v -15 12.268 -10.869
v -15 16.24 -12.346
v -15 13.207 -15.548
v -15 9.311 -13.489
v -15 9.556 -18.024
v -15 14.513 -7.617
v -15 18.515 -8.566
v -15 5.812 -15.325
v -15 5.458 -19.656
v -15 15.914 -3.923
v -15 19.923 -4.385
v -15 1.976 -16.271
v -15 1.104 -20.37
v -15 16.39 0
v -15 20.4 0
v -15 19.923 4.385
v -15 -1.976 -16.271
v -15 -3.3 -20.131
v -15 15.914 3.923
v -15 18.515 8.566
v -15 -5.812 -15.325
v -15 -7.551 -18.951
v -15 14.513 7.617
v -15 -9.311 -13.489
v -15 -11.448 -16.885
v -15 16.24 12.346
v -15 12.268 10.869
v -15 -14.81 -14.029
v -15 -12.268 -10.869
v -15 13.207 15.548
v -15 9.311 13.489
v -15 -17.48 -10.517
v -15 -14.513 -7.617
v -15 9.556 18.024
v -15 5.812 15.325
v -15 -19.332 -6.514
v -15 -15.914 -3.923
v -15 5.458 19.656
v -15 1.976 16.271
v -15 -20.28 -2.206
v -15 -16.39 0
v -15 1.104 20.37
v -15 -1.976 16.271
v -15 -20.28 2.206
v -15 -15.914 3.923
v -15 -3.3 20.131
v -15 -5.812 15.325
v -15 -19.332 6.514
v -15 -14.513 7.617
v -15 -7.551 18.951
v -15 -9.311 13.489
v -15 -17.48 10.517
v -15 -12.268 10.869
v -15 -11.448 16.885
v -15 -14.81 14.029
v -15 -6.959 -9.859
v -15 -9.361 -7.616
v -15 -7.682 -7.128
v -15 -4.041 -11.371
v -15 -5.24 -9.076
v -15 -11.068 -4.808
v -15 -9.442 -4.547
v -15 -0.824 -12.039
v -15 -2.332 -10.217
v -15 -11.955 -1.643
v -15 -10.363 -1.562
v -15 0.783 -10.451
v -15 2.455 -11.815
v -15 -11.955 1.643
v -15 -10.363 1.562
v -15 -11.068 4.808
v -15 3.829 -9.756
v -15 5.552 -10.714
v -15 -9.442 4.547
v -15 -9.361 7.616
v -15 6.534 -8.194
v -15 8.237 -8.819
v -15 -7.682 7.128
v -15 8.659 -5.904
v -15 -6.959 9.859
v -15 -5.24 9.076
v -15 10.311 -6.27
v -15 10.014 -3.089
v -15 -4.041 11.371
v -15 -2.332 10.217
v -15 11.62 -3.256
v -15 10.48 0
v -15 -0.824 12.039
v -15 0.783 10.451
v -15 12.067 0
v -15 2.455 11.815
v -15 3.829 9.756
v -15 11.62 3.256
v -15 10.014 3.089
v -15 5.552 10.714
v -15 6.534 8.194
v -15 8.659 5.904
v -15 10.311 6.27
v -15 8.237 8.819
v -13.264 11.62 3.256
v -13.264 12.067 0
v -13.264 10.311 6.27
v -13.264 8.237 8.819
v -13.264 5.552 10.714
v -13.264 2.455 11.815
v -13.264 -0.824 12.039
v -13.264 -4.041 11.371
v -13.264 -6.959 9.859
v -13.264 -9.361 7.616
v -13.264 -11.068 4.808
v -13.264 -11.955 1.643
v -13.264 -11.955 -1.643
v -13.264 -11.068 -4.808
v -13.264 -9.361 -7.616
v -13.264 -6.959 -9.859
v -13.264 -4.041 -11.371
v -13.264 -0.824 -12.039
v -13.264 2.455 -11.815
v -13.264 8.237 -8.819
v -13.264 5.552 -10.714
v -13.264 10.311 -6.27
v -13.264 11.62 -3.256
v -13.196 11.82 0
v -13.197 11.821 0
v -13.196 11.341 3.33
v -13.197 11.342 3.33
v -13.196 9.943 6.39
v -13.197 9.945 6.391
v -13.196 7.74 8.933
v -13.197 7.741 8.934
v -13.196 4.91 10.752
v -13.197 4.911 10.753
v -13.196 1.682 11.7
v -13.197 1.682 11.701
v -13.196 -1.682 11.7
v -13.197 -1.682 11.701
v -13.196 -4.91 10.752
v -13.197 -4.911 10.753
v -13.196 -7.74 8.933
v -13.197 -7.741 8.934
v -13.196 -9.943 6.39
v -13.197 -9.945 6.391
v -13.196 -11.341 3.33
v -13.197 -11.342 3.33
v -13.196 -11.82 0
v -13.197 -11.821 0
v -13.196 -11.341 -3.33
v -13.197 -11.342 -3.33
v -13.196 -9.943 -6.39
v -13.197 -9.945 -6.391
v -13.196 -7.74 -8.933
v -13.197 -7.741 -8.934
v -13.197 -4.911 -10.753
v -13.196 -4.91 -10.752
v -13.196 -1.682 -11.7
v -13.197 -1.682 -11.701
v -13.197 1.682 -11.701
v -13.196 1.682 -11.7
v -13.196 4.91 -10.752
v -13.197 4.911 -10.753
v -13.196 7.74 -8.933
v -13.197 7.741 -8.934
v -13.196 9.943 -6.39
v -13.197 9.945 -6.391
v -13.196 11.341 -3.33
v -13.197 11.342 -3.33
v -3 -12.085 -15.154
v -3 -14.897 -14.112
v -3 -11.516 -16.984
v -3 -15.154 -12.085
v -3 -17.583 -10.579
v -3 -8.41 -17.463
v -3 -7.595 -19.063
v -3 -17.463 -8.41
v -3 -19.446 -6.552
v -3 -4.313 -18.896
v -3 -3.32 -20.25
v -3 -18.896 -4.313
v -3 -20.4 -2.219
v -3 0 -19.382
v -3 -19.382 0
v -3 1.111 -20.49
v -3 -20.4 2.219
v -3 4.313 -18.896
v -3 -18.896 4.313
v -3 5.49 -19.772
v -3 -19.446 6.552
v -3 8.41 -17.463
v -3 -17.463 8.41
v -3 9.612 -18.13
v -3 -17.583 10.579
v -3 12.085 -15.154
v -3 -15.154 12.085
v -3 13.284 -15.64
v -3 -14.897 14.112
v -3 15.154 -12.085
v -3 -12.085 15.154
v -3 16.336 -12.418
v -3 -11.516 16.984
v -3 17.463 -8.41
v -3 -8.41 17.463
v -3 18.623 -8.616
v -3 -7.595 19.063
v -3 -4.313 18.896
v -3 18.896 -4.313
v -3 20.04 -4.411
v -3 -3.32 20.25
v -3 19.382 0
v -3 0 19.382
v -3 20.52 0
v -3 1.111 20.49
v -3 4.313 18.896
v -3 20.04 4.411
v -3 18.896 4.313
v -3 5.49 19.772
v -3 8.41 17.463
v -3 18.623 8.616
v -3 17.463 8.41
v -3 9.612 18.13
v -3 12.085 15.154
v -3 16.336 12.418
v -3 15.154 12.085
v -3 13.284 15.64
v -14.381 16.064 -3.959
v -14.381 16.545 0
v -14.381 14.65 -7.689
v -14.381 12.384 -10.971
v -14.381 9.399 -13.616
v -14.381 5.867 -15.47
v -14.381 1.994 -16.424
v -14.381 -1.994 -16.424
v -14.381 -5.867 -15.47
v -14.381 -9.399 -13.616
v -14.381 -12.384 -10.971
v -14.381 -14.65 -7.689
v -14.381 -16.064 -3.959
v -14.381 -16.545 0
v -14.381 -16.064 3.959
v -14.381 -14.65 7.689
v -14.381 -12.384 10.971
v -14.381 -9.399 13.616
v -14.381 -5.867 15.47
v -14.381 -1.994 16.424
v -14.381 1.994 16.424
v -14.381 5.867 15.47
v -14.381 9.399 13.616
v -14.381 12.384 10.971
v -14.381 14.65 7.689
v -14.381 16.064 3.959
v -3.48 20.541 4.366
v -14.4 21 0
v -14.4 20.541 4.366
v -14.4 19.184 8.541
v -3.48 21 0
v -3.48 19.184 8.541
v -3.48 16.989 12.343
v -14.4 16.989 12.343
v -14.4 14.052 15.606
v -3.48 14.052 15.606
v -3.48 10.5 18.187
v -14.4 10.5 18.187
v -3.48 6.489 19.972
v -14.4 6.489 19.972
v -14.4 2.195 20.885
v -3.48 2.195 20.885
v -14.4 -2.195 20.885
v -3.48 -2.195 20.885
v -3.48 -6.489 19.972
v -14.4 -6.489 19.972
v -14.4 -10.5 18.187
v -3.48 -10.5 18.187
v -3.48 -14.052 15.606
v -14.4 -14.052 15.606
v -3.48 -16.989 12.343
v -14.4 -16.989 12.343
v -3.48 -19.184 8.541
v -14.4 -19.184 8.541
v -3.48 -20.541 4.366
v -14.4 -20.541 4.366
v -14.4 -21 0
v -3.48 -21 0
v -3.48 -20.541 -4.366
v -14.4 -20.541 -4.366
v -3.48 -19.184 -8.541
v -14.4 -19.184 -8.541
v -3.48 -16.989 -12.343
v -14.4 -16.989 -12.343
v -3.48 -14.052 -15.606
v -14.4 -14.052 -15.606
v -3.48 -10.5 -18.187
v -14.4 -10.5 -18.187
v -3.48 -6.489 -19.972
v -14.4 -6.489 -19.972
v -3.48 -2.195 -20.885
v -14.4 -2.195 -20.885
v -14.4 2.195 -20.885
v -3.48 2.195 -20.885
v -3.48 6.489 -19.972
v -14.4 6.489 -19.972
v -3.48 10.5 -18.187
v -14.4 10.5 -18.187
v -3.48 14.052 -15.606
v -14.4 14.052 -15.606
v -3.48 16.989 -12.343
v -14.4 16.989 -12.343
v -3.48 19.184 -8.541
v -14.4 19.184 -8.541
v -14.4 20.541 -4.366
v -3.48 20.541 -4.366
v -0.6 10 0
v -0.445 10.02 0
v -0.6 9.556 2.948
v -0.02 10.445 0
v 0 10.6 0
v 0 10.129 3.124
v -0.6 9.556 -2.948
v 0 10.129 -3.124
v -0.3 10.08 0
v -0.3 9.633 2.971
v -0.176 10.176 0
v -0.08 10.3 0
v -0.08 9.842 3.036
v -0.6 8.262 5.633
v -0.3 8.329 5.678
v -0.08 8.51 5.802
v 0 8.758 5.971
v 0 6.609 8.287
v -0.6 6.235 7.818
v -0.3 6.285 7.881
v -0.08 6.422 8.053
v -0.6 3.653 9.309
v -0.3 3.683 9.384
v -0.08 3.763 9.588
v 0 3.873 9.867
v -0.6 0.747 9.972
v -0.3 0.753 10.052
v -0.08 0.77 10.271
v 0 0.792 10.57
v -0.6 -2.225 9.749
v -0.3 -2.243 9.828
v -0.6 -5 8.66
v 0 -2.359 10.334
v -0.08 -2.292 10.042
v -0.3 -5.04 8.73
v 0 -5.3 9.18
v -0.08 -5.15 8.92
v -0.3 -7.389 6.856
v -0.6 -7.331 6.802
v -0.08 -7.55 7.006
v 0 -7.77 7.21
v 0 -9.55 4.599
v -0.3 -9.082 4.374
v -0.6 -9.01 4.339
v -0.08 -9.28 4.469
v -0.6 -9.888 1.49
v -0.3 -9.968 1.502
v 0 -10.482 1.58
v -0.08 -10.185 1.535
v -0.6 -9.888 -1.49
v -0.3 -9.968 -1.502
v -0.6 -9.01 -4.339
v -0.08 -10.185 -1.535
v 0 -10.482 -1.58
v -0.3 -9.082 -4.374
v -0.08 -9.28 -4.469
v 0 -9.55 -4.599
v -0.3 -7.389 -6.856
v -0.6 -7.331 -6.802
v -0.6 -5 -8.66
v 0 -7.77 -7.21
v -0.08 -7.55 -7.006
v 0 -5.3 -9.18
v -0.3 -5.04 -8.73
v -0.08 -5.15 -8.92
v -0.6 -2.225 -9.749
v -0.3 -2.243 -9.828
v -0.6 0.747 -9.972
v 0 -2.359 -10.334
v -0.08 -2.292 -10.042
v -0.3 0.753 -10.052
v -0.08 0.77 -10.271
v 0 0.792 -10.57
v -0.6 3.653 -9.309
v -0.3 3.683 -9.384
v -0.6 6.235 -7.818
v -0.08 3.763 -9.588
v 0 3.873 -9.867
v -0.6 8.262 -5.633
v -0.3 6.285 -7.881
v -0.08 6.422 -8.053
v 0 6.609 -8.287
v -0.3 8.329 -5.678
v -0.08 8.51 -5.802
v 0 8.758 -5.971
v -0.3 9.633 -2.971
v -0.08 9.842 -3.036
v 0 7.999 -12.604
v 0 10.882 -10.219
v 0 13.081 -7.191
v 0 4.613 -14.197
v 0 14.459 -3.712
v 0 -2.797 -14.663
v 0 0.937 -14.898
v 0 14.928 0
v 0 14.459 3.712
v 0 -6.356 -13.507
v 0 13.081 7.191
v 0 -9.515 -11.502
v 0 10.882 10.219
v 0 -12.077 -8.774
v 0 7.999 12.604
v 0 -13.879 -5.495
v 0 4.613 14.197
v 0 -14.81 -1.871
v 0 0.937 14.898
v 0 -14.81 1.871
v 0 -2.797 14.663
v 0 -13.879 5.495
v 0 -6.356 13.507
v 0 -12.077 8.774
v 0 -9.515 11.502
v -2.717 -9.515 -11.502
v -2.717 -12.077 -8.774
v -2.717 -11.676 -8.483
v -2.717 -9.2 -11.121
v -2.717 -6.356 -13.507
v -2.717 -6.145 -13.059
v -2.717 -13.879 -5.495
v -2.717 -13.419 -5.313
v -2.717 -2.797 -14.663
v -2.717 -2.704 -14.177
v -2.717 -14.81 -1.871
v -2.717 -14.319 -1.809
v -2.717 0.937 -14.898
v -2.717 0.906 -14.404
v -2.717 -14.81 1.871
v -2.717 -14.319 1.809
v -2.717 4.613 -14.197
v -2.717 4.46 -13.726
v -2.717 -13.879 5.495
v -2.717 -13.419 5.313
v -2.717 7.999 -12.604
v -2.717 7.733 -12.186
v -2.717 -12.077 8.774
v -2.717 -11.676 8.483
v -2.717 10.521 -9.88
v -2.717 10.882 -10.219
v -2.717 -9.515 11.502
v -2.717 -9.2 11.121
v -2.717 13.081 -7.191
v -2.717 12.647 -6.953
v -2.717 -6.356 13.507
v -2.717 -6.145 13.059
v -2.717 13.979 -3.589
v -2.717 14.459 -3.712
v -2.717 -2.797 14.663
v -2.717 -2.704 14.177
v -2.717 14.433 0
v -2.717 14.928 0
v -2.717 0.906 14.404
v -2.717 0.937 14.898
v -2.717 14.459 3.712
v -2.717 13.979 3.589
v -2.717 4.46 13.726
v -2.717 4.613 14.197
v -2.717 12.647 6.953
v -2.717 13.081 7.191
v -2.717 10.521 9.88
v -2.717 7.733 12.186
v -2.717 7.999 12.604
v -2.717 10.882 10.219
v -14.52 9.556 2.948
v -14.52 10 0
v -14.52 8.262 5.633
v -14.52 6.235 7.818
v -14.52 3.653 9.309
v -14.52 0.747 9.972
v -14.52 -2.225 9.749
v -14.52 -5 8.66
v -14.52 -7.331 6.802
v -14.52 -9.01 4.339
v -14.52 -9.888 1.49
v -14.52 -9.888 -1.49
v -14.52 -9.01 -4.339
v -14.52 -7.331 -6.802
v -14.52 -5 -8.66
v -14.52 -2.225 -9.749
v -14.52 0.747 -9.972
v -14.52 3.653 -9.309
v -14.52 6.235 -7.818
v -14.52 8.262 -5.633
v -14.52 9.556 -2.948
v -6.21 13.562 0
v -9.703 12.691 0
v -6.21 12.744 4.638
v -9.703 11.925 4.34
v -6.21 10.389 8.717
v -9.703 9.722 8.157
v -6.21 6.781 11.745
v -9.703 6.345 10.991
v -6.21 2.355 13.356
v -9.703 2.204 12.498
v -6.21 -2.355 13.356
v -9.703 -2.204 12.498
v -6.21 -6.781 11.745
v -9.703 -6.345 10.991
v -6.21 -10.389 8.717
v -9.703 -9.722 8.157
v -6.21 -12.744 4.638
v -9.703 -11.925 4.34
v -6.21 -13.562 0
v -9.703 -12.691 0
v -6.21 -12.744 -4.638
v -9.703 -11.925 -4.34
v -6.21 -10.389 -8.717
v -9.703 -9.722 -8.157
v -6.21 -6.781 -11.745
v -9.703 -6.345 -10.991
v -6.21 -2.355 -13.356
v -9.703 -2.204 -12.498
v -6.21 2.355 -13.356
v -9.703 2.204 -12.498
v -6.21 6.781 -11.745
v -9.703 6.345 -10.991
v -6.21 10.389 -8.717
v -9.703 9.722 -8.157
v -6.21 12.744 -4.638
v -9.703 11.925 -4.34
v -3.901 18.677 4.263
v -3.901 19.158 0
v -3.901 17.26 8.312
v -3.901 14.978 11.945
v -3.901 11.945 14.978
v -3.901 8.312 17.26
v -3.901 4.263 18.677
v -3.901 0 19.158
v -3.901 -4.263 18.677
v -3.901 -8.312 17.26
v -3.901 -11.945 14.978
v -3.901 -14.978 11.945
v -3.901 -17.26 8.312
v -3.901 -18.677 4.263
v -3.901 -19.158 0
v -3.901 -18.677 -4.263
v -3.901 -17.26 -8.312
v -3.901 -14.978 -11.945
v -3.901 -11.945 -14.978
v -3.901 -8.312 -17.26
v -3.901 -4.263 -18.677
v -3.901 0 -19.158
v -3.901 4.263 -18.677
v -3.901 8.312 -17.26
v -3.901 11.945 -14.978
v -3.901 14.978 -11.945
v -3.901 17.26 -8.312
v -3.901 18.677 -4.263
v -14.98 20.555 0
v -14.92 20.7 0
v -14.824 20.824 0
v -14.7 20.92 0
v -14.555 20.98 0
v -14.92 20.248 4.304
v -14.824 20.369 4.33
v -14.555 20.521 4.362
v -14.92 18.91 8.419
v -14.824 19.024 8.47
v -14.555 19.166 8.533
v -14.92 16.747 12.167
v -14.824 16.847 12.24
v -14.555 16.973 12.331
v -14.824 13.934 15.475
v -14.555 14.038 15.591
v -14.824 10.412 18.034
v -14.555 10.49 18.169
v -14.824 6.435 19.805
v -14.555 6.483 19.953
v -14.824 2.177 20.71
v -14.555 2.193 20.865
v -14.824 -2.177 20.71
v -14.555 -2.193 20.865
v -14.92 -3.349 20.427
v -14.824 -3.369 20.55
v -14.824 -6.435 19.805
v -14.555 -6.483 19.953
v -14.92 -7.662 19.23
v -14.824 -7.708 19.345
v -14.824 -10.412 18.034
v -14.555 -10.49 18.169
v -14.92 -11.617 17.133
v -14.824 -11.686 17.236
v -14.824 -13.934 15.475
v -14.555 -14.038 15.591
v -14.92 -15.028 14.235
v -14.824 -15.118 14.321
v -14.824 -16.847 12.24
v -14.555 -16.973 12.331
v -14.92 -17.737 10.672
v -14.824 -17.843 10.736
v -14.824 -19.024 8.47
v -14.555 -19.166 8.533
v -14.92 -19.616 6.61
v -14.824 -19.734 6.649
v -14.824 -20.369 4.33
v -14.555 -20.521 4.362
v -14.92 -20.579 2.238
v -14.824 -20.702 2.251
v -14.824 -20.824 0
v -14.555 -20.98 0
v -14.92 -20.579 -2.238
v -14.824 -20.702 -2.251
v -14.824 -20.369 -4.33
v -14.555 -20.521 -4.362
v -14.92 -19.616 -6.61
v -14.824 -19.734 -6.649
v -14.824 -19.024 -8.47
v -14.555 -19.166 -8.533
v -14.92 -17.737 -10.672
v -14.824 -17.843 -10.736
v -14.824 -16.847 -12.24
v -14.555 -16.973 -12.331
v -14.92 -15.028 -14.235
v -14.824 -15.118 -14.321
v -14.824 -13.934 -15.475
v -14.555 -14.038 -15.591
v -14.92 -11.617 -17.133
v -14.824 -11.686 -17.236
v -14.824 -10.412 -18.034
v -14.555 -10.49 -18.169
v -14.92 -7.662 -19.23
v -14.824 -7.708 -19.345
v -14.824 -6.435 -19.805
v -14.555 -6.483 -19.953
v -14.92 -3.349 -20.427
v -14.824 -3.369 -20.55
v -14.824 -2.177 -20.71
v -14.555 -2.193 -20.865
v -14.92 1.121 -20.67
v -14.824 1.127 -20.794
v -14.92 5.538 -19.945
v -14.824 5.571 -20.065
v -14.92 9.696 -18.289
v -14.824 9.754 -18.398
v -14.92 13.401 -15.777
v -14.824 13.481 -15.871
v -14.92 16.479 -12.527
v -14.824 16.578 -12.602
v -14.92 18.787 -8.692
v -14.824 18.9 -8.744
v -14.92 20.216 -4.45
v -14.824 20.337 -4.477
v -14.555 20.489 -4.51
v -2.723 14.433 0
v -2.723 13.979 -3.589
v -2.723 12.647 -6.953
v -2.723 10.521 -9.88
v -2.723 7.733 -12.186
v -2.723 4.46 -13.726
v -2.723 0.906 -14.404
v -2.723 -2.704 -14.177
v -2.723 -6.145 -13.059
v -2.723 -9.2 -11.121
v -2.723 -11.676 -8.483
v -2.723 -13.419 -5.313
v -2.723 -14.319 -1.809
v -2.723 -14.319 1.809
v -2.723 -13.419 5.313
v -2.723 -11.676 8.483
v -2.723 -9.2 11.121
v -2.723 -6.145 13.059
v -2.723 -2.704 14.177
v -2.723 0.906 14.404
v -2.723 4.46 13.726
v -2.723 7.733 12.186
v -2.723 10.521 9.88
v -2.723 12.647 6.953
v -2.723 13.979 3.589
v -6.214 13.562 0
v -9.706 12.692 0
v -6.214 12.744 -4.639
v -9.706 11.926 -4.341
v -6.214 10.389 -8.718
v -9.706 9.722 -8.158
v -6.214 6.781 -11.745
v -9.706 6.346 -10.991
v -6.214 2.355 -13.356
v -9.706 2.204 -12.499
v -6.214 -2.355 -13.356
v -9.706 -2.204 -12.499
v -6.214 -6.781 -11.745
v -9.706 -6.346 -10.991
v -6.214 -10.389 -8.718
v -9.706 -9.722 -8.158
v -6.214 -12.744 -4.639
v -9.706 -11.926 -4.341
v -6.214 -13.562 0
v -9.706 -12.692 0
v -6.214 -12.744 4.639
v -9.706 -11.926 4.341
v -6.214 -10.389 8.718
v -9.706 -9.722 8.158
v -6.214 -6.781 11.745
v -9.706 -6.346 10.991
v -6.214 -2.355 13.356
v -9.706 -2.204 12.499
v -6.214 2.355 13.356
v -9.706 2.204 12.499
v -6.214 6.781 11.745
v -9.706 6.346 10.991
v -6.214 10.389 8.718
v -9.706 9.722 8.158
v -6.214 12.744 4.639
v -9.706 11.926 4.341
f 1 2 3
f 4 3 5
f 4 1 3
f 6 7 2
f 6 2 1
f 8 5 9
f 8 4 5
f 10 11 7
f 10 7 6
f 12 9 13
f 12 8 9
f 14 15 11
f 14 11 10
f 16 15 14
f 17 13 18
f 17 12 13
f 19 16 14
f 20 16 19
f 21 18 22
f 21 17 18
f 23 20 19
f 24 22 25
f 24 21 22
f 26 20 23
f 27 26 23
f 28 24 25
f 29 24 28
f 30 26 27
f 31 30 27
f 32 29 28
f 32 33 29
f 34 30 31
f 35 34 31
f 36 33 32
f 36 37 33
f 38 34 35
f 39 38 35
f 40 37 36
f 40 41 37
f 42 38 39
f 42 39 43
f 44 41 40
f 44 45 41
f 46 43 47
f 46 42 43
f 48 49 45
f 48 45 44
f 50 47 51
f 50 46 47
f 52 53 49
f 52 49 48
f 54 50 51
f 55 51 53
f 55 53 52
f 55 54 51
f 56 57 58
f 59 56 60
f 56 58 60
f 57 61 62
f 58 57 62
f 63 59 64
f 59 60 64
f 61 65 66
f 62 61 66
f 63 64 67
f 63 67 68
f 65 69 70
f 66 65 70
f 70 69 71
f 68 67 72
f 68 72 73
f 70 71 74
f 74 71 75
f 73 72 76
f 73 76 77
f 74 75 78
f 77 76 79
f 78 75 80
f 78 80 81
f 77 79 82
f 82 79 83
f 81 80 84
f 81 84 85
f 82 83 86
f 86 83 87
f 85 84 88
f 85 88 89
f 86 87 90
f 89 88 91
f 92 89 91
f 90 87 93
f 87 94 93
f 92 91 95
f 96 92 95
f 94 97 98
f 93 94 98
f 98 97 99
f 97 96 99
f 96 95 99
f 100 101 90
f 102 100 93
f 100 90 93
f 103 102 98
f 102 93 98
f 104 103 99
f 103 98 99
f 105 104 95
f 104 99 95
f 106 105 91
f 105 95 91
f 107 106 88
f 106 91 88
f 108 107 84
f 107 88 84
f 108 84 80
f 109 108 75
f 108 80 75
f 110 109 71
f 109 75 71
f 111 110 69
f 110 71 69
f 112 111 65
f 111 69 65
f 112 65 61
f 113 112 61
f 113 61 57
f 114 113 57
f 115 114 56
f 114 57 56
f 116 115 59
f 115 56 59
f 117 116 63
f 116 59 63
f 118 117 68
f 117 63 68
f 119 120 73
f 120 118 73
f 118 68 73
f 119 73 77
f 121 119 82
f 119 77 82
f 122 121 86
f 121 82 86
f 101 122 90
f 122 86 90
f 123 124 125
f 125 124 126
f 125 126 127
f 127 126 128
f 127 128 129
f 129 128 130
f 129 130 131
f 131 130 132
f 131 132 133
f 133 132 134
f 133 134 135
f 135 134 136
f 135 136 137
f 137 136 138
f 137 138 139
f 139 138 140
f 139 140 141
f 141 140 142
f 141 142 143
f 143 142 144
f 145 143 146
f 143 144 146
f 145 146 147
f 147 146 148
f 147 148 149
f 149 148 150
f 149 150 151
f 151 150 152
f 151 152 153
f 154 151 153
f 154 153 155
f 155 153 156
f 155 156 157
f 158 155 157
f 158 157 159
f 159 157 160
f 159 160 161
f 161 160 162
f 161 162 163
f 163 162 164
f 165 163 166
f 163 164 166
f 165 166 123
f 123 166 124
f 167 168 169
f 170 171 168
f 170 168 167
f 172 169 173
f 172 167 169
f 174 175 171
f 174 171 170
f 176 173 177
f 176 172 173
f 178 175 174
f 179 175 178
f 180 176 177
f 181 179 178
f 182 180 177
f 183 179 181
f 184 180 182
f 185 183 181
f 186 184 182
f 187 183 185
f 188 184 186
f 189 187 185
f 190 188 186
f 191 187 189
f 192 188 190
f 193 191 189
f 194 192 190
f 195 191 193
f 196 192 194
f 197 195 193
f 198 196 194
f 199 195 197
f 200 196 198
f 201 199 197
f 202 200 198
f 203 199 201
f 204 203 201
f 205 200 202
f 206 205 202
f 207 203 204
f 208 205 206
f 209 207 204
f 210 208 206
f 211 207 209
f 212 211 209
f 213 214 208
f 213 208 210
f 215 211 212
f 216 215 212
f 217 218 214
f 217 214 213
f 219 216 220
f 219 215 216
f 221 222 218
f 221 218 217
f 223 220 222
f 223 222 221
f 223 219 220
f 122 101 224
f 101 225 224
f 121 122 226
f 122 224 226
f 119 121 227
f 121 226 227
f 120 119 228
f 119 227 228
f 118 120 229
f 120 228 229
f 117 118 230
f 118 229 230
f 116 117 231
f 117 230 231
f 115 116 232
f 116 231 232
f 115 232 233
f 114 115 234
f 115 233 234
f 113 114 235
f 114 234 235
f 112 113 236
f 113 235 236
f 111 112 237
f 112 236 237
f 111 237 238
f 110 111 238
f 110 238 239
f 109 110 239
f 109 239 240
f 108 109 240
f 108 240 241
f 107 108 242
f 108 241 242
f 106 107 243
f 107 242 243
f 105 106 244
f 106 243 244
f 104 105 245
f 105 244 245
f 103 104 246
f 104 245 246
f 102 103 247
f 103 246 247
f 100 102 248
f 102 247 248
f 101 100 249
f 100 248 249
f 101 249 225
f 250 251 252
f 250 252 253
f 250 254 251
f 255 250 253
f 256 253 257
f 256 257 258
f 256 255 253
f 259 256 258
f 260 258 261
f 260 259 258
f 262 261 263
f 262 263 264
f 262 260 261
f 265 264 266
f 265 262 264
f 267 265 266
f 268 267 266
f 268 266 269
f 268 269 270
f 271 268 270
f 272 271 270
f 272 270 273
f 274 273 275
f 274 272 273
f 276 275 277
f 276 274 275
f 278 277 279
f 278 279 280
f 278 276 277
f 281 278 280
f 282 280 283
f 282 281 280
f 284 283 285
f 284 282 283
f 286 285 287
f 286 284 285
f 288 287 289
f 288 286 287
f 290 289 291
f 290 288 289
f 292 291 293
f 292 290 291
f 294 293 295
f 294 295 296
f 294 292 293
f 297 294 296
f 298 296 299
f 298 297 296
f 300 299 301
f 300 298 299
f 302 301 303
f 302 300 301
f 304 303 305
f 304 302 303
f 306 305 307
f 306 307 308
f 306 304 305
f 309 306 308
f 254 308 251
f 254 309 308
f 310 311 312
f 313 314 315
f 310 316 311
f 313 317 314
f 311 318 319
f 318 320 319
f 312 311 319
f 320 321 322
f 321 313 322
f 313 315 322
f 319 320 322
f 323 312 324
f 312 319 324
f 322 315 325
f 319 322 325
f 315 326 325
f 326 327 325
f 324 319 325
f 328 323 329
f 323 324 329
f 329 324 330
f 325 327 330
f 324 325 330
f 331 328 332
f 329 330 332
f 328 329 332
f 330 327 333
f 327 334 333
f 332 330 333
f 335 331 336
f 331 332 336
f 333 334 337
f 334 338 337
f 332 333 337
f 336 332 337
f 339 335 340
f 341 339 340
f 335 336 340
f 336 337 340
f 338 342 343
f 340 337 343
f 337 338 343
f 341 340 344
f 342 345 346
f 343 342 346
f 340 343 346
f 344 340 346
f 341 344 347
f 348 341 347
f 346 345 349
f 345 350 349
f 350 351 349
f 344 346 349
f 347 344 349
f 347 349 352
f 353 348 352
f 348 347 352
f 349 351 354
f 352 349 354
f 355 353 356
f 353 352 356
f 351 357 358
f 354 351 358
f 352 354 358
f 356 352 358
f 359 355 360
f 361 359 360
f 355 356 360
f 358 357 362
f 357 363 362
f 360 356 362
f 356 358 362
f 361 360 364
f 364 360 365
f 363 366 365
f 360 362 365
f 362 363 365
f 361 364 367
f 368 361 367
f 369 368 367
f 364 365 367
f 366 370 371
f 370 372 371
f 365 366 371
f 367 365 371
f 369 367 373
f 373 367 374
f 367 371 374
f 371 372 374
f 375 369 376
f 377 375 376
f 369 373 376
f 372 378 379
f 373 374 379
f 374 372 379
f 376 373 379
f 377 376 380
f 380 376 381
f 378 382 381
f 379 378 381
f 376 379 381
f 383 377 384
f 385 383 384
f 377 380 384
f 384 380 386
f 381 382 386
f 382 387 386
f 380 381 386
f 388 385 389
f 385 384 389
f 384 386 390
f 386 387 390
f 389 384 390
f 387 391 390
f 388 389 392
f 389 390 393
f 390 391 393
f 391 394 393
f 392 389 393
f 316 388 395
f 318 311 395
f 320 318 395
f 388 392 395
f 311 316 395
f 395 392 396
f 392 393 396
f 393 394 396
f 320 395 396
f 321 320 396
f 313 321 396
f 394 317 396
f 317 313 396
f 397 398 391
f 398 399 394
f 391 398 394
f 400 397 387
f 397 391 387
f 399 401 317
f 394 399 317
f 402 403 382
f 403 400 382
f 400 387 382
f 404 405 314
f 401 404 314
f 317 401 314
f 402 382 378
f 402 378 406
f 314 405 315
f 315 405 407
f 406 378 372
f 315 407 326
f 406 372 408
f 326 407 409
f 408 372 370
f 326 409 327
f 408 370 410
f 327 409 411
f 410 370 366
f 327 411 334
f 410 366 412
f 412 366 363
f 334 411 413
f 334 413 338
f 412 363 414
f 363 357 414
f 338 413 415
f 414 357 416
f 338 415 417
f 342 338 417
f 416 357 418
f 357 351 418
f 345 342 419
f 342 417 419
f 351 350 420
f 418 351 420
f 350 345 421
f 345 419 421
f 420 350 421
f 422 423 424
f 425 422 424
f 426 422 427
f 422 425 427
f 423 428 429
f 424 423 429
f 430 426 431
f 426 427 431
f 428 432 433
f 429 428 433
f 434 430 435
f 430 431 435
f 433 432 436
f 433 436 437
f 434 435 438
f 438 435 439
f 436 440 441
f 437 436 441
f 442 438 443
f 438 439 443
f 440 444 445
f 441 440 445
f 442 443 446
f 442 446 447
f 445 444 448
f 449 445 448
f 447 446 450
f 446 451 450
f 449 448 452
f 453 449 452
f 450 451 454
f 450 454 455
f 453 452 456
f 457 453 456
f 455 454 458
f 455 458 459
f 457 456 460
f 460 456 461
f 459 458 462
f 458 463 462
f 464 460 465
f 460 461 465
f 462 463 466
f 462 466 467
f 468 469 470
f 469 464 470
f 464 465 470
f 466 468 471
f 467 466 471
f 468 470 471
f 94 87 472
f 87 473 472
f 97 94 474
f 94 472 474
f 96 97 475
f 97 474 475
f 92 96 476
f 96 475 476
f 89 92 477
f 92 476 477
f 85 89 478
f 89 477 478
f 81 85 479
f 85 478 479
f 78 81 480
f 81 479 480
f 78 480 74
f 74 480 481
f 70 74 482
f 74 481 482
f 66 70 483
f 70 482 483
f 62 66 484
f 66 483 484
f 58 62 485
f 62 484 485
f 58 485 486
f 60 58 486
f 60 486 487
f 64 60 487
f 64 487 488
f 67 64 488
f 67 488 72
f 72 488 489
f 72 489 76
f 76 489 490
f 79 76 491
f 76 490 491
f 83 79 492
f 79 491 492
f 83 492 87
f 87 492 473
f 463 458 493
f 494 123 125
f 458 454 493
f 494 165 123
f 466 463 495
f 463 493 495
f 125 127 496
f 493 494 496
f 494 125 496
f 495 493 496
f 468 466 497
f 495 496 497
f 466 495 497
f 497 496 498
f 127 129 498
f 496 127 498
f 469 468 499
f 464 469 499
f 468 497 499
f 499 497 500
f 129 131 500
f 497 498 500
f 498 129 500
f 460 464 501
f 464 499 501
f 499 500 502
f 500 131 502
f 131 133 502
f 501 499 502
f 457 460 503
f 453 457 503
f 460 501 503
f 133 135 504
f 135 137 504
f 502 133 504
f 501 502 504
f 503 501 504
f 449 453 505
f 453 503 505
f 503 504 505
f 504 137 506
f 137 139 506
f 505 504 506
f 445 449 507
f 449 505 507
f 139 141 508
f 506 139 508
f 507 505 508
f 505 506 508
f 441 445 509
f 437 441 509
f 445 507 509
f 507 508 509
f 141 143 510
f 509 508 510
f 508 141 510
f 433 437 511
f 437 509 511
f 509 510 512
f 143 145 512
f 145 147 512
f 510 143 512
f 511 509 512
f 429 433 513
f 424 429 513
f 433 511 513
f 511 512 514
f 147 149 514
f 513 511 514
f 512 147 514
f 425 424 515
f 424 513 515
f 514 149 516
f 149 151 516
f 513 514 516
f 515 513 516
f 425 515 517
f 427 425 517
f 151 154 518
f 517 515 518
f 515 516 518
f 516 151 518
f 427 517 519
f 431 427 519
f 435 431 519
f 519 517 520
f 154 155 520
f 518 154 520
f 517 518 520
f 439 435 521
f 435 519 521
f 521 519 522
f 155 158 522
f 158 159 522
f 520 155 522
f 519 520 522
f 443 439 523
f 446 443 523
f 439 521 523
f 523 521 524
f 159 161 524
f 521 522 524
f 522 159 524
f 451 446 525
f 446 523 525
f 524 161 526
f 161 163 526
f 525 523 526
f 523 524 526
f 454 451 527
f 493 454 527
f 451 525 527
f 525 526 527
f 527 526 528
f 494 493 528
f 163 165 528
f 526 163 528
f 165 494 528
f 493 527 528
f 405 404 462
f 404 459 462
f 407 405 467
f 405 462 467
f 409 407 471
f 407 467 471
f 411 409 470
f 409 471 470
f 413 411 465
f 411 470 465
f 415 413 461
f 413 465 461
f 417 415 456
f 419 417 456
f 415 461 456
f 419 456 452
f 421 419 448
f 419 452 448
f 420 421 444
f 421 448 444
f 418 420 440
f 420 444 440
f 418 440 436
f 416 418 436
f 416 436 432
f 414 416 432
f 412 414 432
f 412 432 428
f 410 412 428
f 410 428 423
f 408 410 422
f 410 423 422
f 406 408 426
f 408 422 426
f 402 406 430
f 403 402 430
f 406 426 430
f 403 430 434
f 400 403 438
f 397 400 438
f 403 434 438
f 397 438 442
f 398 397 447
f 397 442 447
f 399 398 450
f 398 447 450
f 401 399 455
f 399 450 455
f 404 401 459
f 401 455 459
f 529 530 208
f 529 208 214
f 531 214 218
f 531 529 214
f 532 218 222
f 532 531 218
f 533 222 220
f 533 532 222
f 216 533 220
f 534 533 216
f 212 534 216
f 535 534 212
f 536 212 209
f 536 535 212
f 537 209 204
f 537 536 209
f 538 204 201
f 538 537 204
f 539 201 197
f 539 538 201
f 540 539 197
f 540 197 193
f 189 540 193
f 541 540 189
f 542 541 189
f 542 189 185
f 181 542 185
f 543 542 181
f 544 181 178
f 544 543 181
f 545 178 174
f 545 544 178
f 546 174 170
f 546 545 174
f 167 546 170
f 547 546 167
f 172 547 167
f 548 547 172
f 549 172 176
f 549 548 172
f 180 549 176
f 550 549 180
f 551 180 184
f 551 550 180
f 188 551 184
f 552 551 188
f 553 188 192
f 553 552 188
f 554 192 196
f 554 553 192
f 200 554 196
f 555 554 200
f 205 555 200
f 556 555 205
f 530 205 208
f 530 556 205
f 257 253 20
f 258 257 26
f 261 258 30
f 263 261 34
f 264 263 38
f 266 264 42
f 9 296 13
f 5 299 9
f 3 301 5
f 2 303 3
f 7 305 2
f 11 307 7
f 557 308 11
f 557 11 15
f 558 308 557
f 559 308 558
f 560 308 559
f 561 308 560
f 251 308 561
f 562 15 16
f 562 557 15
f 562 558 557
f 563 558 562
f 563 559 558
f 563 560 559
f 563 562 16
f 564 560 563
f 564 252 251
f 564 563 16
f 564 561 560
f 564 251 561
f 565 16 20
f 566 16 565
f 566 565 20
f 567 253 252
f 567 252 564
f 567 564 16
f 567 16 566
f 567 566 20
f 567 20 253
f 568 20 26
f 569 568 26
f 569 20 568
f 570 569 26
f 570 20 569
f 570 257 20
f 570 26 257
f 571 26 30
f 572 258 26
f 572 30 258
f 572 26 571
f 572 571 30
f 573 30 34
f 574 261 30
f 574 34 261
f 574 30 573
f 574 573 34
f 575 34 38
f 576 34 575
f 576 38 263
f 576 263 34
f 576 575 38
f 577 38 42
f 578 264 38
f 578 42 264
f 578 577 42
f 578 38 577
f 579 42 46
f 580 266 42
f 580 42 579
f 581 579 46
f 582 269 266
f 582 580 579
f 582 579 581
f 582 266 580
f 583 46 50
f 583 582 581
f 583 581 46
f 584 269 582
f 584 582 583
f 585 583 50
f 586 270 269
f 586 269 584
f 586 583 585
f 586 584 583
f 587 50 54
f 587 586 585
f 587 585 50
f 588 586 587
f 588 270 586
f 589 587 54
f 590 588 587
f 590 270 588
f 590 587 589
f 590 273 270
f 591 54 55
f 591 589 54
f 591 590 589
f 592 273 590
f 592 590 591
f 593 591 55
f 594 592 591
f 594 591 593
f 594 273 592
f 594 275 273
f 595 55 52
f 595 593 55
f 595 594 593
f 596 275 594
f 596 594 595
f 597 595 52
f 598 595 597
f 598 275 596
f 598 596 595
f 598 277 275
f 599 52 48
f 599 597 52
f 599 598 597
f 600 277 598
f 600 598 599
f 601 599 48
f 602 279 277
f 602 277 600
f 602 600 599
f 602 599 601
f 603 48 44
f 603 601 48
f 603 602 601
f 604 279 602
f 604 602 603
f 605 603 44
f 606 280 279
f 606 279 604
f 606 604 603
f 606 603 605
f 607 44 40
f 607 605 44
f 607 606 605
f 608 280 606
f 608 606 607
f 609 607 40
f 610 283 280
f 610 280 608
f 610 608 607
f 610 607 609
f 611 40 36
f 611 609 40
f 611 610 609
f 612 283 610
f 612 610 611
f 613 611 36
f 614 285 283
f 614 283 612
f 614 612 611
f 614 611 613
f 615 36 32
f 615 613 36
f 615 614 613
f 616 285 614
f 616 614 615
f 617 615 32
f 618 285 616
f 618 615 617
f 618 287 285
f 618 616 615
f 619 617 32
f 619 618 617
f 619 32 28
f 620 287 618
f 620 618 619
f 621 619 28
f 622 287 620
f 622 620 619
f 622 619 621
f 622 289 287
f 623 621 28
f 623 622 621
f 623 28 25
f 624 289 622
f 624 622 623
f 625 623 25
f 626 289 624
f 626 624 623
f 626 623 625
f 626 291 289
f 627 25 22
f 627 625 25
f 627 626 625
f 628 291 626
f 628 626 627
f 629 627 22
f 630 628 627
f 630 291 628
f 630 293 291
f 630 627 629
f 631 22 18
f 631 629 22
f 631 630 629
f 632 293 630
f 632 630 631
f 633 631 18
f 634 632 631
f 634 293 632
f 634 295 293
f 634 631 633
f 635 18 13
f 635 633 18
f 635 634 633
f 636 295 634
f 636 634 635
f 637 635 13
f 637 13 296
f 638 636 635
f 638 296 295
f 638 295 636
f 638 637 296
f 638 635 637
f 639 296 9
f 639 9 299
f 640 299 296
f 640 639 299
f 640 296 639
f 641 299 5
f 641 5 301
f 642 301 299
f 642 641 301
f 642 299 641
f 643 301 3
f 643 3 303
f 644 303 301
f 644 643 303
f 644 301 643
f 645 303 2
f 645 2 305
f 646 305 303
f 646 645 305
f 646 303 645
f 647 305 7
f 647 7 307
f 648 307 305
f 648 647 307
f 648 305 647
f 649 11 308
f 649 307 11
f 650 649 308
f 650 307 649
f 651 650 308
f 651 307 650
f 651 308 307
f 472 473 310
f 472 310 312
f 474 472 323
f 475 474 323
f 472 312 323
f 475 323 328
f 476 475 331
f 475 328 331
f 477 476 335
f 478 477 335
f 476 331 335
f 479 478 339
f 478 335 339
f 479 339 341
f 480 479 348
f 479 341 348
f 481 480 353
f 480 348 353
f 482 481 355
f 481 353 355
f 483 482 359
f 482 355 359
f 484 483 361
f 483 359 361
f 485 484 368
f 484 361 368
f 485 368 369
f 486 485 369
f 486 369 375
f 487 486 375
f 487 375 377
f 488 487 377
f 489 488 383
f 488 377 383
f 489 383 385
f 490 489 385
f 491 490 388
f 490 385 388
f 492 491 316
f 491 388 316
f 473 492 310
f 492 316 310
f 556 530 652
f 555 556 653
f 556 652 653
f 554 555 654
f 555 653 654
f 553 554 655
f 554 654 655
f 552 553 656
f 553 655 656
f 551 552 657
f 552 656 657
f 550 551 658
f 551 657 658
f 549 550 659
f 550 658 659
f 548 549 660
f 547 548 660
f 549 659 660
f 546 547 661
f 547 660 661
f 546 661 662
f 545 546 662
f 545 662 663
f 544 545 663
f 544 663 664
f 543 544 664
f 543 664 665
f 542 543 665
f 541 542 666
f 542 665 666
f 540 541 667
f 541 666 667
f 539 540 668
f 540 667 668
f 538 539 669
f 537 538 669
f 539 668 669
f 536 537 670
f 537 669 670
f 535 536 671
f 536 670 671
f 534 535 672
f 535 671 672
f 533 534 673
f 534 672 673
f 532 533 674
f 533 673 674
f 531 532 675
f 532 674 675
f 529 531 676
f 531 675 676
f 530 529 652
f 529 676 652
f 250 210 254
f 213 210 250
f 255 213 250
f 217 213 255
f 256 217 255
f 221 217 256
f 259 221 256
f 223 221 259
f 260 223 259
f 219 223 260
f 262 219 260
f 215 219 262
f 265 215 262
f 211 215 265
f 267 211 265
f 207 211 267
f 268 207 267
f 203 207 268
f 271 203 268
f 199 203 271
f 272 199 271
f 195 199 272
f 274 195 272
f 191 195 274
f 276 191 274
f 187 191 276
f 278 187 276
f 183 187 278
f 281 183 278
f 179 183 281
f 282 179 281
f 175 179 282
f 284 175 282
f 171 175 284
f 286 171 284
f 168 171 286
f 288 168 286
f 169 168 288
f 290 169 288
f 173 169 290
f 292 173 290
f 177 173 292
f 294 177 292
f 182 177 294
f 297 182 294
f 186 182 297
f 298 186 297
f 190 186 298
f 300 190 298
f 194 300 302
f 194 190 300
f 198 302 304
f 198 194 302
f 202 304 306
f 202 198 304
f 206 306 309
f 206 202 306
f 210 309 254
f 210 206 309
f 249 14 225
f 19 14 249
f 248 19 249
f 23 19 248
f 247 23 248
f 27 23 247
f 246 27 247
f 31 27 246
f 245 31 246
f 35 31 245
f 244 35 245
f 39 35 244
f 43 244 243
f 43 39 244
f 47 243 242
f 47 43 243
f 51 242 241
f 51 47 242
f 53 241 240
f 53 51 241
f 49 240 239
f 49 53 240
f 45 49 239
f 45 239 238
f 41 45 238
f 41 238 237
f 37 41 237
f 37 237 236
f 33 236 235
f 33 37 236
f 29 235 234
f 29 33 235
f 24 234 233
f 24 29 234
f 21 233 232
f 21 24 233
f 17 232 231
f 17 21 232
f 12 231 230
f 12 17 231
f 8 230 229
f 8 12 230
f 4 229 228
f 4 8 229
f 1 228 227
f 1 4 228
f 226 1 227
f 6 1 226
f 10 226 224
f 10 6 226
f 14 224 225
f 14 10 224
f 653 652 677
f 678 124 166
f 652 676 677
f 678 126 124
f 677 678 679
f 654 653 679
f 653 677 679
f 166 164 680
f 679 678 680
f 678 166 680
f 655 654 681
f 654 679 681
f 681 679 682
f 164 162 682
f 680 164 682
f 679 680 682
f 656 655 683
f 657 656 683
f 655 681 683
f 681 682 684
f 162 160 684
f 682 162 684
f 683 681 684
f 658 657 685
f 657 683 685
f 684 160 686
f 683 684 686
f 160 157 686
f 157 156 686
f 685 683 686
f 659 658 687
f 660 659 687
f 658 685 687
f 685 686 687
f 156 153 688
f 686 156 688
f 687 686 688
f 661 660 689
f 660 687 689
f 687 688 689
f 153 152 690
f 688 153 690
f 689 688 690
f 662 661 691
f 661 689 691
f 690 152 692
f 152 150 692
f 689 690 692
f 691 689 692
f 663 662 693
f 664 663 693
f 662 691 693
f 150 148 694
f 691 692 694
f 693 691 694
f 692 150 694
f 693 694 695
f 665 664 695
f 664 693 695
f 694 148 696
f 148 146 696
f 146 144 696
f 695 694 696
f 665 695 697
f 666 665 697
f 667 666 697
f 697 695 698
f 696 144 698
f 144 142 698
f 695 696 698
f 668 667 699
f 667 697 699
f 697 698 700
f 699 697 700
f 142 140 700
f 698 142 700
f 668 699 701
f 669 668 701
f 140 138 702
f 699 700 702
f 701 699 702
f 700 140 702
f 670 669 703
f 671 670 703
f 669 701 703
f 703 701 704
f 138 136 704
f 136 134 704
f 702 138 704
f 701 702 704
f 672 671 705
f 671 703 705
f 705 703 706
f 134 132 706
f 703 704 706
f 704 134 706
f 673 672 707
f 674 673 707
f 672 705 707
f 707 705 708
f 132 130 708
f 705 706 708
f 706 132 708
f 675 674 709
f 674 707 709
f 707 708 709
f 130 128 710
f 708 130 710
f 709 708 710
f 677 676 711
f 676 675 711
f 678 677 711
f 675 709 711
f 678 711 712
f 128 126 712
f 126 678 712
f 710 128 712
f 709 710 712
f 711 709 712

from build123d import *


with BuildPart() as part:
    # OutRacSke → OuterRace (revolve)
    with BuildSketch(Plane.XY):
        with BuildLine():
            Line((-3, 19.382436034), (-15, 16.3905))
            Line((-15, 16.3905), (-15, 20.4))
            ThreePointArc((-15, 20.4), (-14.824264069, 20.824264069), (-14.4, 21))
            Line((-14.4, 21), (-3.48, 21))
            Line((-3.48, 21), (-3, 20.52))
            Line((-3, 20.52), (-3, 19.382436034))
        make_face()
    revolve(axis=Axis((-42.5, 0, 0), (1, 0, 0)))

    # RolSimSke → RollersSimplified (revolve)
    with BuildSketch(Plane.XY):
        Polygon((-14.4, 16.622797286), (-3.920806156, 19.235553758), (-2.723292773, 14.432589913), (-13.202486617, 11.81983344), align=None)
    revolve(axis=Axis((0, 0, 0), (-1, 0, 0)))

    # InsRacSke → InnerRace (revolve)
    with BuildSketch(Plane.XY):
        with BuildLine():
            Line((-13.258207732, 12.06733344), (-15, 12.06733344))
            Line((-15, 12.06733344), (-15, 10.48))
            Line((-15, 10.48), (-14.52, 10))
            Line((-14.52, 10), (-0.6, 10))
            ThreePointArc((-0.6, 10), (-0.175735931, 10.175735931), (0, 10.6))
            Line((0, 10.6), (0, 14.927589913))
            Line((0, 14.927589913), (-2.717305207, 14.927589913))
            Line((-2.717305207, 14.927589913), (-2.717305207, 14.432589913))
            Line((-2.717305207, 14.432589913), (-13.196499051, 11.81983344))
            Line((-13.196499051, 11.81983344), (-13.258207732, 12.06733344))
        make_face()
    revolve(axis=Axis((-42.5, 0, 0), (1, 0, 0)))


solid = part.part
